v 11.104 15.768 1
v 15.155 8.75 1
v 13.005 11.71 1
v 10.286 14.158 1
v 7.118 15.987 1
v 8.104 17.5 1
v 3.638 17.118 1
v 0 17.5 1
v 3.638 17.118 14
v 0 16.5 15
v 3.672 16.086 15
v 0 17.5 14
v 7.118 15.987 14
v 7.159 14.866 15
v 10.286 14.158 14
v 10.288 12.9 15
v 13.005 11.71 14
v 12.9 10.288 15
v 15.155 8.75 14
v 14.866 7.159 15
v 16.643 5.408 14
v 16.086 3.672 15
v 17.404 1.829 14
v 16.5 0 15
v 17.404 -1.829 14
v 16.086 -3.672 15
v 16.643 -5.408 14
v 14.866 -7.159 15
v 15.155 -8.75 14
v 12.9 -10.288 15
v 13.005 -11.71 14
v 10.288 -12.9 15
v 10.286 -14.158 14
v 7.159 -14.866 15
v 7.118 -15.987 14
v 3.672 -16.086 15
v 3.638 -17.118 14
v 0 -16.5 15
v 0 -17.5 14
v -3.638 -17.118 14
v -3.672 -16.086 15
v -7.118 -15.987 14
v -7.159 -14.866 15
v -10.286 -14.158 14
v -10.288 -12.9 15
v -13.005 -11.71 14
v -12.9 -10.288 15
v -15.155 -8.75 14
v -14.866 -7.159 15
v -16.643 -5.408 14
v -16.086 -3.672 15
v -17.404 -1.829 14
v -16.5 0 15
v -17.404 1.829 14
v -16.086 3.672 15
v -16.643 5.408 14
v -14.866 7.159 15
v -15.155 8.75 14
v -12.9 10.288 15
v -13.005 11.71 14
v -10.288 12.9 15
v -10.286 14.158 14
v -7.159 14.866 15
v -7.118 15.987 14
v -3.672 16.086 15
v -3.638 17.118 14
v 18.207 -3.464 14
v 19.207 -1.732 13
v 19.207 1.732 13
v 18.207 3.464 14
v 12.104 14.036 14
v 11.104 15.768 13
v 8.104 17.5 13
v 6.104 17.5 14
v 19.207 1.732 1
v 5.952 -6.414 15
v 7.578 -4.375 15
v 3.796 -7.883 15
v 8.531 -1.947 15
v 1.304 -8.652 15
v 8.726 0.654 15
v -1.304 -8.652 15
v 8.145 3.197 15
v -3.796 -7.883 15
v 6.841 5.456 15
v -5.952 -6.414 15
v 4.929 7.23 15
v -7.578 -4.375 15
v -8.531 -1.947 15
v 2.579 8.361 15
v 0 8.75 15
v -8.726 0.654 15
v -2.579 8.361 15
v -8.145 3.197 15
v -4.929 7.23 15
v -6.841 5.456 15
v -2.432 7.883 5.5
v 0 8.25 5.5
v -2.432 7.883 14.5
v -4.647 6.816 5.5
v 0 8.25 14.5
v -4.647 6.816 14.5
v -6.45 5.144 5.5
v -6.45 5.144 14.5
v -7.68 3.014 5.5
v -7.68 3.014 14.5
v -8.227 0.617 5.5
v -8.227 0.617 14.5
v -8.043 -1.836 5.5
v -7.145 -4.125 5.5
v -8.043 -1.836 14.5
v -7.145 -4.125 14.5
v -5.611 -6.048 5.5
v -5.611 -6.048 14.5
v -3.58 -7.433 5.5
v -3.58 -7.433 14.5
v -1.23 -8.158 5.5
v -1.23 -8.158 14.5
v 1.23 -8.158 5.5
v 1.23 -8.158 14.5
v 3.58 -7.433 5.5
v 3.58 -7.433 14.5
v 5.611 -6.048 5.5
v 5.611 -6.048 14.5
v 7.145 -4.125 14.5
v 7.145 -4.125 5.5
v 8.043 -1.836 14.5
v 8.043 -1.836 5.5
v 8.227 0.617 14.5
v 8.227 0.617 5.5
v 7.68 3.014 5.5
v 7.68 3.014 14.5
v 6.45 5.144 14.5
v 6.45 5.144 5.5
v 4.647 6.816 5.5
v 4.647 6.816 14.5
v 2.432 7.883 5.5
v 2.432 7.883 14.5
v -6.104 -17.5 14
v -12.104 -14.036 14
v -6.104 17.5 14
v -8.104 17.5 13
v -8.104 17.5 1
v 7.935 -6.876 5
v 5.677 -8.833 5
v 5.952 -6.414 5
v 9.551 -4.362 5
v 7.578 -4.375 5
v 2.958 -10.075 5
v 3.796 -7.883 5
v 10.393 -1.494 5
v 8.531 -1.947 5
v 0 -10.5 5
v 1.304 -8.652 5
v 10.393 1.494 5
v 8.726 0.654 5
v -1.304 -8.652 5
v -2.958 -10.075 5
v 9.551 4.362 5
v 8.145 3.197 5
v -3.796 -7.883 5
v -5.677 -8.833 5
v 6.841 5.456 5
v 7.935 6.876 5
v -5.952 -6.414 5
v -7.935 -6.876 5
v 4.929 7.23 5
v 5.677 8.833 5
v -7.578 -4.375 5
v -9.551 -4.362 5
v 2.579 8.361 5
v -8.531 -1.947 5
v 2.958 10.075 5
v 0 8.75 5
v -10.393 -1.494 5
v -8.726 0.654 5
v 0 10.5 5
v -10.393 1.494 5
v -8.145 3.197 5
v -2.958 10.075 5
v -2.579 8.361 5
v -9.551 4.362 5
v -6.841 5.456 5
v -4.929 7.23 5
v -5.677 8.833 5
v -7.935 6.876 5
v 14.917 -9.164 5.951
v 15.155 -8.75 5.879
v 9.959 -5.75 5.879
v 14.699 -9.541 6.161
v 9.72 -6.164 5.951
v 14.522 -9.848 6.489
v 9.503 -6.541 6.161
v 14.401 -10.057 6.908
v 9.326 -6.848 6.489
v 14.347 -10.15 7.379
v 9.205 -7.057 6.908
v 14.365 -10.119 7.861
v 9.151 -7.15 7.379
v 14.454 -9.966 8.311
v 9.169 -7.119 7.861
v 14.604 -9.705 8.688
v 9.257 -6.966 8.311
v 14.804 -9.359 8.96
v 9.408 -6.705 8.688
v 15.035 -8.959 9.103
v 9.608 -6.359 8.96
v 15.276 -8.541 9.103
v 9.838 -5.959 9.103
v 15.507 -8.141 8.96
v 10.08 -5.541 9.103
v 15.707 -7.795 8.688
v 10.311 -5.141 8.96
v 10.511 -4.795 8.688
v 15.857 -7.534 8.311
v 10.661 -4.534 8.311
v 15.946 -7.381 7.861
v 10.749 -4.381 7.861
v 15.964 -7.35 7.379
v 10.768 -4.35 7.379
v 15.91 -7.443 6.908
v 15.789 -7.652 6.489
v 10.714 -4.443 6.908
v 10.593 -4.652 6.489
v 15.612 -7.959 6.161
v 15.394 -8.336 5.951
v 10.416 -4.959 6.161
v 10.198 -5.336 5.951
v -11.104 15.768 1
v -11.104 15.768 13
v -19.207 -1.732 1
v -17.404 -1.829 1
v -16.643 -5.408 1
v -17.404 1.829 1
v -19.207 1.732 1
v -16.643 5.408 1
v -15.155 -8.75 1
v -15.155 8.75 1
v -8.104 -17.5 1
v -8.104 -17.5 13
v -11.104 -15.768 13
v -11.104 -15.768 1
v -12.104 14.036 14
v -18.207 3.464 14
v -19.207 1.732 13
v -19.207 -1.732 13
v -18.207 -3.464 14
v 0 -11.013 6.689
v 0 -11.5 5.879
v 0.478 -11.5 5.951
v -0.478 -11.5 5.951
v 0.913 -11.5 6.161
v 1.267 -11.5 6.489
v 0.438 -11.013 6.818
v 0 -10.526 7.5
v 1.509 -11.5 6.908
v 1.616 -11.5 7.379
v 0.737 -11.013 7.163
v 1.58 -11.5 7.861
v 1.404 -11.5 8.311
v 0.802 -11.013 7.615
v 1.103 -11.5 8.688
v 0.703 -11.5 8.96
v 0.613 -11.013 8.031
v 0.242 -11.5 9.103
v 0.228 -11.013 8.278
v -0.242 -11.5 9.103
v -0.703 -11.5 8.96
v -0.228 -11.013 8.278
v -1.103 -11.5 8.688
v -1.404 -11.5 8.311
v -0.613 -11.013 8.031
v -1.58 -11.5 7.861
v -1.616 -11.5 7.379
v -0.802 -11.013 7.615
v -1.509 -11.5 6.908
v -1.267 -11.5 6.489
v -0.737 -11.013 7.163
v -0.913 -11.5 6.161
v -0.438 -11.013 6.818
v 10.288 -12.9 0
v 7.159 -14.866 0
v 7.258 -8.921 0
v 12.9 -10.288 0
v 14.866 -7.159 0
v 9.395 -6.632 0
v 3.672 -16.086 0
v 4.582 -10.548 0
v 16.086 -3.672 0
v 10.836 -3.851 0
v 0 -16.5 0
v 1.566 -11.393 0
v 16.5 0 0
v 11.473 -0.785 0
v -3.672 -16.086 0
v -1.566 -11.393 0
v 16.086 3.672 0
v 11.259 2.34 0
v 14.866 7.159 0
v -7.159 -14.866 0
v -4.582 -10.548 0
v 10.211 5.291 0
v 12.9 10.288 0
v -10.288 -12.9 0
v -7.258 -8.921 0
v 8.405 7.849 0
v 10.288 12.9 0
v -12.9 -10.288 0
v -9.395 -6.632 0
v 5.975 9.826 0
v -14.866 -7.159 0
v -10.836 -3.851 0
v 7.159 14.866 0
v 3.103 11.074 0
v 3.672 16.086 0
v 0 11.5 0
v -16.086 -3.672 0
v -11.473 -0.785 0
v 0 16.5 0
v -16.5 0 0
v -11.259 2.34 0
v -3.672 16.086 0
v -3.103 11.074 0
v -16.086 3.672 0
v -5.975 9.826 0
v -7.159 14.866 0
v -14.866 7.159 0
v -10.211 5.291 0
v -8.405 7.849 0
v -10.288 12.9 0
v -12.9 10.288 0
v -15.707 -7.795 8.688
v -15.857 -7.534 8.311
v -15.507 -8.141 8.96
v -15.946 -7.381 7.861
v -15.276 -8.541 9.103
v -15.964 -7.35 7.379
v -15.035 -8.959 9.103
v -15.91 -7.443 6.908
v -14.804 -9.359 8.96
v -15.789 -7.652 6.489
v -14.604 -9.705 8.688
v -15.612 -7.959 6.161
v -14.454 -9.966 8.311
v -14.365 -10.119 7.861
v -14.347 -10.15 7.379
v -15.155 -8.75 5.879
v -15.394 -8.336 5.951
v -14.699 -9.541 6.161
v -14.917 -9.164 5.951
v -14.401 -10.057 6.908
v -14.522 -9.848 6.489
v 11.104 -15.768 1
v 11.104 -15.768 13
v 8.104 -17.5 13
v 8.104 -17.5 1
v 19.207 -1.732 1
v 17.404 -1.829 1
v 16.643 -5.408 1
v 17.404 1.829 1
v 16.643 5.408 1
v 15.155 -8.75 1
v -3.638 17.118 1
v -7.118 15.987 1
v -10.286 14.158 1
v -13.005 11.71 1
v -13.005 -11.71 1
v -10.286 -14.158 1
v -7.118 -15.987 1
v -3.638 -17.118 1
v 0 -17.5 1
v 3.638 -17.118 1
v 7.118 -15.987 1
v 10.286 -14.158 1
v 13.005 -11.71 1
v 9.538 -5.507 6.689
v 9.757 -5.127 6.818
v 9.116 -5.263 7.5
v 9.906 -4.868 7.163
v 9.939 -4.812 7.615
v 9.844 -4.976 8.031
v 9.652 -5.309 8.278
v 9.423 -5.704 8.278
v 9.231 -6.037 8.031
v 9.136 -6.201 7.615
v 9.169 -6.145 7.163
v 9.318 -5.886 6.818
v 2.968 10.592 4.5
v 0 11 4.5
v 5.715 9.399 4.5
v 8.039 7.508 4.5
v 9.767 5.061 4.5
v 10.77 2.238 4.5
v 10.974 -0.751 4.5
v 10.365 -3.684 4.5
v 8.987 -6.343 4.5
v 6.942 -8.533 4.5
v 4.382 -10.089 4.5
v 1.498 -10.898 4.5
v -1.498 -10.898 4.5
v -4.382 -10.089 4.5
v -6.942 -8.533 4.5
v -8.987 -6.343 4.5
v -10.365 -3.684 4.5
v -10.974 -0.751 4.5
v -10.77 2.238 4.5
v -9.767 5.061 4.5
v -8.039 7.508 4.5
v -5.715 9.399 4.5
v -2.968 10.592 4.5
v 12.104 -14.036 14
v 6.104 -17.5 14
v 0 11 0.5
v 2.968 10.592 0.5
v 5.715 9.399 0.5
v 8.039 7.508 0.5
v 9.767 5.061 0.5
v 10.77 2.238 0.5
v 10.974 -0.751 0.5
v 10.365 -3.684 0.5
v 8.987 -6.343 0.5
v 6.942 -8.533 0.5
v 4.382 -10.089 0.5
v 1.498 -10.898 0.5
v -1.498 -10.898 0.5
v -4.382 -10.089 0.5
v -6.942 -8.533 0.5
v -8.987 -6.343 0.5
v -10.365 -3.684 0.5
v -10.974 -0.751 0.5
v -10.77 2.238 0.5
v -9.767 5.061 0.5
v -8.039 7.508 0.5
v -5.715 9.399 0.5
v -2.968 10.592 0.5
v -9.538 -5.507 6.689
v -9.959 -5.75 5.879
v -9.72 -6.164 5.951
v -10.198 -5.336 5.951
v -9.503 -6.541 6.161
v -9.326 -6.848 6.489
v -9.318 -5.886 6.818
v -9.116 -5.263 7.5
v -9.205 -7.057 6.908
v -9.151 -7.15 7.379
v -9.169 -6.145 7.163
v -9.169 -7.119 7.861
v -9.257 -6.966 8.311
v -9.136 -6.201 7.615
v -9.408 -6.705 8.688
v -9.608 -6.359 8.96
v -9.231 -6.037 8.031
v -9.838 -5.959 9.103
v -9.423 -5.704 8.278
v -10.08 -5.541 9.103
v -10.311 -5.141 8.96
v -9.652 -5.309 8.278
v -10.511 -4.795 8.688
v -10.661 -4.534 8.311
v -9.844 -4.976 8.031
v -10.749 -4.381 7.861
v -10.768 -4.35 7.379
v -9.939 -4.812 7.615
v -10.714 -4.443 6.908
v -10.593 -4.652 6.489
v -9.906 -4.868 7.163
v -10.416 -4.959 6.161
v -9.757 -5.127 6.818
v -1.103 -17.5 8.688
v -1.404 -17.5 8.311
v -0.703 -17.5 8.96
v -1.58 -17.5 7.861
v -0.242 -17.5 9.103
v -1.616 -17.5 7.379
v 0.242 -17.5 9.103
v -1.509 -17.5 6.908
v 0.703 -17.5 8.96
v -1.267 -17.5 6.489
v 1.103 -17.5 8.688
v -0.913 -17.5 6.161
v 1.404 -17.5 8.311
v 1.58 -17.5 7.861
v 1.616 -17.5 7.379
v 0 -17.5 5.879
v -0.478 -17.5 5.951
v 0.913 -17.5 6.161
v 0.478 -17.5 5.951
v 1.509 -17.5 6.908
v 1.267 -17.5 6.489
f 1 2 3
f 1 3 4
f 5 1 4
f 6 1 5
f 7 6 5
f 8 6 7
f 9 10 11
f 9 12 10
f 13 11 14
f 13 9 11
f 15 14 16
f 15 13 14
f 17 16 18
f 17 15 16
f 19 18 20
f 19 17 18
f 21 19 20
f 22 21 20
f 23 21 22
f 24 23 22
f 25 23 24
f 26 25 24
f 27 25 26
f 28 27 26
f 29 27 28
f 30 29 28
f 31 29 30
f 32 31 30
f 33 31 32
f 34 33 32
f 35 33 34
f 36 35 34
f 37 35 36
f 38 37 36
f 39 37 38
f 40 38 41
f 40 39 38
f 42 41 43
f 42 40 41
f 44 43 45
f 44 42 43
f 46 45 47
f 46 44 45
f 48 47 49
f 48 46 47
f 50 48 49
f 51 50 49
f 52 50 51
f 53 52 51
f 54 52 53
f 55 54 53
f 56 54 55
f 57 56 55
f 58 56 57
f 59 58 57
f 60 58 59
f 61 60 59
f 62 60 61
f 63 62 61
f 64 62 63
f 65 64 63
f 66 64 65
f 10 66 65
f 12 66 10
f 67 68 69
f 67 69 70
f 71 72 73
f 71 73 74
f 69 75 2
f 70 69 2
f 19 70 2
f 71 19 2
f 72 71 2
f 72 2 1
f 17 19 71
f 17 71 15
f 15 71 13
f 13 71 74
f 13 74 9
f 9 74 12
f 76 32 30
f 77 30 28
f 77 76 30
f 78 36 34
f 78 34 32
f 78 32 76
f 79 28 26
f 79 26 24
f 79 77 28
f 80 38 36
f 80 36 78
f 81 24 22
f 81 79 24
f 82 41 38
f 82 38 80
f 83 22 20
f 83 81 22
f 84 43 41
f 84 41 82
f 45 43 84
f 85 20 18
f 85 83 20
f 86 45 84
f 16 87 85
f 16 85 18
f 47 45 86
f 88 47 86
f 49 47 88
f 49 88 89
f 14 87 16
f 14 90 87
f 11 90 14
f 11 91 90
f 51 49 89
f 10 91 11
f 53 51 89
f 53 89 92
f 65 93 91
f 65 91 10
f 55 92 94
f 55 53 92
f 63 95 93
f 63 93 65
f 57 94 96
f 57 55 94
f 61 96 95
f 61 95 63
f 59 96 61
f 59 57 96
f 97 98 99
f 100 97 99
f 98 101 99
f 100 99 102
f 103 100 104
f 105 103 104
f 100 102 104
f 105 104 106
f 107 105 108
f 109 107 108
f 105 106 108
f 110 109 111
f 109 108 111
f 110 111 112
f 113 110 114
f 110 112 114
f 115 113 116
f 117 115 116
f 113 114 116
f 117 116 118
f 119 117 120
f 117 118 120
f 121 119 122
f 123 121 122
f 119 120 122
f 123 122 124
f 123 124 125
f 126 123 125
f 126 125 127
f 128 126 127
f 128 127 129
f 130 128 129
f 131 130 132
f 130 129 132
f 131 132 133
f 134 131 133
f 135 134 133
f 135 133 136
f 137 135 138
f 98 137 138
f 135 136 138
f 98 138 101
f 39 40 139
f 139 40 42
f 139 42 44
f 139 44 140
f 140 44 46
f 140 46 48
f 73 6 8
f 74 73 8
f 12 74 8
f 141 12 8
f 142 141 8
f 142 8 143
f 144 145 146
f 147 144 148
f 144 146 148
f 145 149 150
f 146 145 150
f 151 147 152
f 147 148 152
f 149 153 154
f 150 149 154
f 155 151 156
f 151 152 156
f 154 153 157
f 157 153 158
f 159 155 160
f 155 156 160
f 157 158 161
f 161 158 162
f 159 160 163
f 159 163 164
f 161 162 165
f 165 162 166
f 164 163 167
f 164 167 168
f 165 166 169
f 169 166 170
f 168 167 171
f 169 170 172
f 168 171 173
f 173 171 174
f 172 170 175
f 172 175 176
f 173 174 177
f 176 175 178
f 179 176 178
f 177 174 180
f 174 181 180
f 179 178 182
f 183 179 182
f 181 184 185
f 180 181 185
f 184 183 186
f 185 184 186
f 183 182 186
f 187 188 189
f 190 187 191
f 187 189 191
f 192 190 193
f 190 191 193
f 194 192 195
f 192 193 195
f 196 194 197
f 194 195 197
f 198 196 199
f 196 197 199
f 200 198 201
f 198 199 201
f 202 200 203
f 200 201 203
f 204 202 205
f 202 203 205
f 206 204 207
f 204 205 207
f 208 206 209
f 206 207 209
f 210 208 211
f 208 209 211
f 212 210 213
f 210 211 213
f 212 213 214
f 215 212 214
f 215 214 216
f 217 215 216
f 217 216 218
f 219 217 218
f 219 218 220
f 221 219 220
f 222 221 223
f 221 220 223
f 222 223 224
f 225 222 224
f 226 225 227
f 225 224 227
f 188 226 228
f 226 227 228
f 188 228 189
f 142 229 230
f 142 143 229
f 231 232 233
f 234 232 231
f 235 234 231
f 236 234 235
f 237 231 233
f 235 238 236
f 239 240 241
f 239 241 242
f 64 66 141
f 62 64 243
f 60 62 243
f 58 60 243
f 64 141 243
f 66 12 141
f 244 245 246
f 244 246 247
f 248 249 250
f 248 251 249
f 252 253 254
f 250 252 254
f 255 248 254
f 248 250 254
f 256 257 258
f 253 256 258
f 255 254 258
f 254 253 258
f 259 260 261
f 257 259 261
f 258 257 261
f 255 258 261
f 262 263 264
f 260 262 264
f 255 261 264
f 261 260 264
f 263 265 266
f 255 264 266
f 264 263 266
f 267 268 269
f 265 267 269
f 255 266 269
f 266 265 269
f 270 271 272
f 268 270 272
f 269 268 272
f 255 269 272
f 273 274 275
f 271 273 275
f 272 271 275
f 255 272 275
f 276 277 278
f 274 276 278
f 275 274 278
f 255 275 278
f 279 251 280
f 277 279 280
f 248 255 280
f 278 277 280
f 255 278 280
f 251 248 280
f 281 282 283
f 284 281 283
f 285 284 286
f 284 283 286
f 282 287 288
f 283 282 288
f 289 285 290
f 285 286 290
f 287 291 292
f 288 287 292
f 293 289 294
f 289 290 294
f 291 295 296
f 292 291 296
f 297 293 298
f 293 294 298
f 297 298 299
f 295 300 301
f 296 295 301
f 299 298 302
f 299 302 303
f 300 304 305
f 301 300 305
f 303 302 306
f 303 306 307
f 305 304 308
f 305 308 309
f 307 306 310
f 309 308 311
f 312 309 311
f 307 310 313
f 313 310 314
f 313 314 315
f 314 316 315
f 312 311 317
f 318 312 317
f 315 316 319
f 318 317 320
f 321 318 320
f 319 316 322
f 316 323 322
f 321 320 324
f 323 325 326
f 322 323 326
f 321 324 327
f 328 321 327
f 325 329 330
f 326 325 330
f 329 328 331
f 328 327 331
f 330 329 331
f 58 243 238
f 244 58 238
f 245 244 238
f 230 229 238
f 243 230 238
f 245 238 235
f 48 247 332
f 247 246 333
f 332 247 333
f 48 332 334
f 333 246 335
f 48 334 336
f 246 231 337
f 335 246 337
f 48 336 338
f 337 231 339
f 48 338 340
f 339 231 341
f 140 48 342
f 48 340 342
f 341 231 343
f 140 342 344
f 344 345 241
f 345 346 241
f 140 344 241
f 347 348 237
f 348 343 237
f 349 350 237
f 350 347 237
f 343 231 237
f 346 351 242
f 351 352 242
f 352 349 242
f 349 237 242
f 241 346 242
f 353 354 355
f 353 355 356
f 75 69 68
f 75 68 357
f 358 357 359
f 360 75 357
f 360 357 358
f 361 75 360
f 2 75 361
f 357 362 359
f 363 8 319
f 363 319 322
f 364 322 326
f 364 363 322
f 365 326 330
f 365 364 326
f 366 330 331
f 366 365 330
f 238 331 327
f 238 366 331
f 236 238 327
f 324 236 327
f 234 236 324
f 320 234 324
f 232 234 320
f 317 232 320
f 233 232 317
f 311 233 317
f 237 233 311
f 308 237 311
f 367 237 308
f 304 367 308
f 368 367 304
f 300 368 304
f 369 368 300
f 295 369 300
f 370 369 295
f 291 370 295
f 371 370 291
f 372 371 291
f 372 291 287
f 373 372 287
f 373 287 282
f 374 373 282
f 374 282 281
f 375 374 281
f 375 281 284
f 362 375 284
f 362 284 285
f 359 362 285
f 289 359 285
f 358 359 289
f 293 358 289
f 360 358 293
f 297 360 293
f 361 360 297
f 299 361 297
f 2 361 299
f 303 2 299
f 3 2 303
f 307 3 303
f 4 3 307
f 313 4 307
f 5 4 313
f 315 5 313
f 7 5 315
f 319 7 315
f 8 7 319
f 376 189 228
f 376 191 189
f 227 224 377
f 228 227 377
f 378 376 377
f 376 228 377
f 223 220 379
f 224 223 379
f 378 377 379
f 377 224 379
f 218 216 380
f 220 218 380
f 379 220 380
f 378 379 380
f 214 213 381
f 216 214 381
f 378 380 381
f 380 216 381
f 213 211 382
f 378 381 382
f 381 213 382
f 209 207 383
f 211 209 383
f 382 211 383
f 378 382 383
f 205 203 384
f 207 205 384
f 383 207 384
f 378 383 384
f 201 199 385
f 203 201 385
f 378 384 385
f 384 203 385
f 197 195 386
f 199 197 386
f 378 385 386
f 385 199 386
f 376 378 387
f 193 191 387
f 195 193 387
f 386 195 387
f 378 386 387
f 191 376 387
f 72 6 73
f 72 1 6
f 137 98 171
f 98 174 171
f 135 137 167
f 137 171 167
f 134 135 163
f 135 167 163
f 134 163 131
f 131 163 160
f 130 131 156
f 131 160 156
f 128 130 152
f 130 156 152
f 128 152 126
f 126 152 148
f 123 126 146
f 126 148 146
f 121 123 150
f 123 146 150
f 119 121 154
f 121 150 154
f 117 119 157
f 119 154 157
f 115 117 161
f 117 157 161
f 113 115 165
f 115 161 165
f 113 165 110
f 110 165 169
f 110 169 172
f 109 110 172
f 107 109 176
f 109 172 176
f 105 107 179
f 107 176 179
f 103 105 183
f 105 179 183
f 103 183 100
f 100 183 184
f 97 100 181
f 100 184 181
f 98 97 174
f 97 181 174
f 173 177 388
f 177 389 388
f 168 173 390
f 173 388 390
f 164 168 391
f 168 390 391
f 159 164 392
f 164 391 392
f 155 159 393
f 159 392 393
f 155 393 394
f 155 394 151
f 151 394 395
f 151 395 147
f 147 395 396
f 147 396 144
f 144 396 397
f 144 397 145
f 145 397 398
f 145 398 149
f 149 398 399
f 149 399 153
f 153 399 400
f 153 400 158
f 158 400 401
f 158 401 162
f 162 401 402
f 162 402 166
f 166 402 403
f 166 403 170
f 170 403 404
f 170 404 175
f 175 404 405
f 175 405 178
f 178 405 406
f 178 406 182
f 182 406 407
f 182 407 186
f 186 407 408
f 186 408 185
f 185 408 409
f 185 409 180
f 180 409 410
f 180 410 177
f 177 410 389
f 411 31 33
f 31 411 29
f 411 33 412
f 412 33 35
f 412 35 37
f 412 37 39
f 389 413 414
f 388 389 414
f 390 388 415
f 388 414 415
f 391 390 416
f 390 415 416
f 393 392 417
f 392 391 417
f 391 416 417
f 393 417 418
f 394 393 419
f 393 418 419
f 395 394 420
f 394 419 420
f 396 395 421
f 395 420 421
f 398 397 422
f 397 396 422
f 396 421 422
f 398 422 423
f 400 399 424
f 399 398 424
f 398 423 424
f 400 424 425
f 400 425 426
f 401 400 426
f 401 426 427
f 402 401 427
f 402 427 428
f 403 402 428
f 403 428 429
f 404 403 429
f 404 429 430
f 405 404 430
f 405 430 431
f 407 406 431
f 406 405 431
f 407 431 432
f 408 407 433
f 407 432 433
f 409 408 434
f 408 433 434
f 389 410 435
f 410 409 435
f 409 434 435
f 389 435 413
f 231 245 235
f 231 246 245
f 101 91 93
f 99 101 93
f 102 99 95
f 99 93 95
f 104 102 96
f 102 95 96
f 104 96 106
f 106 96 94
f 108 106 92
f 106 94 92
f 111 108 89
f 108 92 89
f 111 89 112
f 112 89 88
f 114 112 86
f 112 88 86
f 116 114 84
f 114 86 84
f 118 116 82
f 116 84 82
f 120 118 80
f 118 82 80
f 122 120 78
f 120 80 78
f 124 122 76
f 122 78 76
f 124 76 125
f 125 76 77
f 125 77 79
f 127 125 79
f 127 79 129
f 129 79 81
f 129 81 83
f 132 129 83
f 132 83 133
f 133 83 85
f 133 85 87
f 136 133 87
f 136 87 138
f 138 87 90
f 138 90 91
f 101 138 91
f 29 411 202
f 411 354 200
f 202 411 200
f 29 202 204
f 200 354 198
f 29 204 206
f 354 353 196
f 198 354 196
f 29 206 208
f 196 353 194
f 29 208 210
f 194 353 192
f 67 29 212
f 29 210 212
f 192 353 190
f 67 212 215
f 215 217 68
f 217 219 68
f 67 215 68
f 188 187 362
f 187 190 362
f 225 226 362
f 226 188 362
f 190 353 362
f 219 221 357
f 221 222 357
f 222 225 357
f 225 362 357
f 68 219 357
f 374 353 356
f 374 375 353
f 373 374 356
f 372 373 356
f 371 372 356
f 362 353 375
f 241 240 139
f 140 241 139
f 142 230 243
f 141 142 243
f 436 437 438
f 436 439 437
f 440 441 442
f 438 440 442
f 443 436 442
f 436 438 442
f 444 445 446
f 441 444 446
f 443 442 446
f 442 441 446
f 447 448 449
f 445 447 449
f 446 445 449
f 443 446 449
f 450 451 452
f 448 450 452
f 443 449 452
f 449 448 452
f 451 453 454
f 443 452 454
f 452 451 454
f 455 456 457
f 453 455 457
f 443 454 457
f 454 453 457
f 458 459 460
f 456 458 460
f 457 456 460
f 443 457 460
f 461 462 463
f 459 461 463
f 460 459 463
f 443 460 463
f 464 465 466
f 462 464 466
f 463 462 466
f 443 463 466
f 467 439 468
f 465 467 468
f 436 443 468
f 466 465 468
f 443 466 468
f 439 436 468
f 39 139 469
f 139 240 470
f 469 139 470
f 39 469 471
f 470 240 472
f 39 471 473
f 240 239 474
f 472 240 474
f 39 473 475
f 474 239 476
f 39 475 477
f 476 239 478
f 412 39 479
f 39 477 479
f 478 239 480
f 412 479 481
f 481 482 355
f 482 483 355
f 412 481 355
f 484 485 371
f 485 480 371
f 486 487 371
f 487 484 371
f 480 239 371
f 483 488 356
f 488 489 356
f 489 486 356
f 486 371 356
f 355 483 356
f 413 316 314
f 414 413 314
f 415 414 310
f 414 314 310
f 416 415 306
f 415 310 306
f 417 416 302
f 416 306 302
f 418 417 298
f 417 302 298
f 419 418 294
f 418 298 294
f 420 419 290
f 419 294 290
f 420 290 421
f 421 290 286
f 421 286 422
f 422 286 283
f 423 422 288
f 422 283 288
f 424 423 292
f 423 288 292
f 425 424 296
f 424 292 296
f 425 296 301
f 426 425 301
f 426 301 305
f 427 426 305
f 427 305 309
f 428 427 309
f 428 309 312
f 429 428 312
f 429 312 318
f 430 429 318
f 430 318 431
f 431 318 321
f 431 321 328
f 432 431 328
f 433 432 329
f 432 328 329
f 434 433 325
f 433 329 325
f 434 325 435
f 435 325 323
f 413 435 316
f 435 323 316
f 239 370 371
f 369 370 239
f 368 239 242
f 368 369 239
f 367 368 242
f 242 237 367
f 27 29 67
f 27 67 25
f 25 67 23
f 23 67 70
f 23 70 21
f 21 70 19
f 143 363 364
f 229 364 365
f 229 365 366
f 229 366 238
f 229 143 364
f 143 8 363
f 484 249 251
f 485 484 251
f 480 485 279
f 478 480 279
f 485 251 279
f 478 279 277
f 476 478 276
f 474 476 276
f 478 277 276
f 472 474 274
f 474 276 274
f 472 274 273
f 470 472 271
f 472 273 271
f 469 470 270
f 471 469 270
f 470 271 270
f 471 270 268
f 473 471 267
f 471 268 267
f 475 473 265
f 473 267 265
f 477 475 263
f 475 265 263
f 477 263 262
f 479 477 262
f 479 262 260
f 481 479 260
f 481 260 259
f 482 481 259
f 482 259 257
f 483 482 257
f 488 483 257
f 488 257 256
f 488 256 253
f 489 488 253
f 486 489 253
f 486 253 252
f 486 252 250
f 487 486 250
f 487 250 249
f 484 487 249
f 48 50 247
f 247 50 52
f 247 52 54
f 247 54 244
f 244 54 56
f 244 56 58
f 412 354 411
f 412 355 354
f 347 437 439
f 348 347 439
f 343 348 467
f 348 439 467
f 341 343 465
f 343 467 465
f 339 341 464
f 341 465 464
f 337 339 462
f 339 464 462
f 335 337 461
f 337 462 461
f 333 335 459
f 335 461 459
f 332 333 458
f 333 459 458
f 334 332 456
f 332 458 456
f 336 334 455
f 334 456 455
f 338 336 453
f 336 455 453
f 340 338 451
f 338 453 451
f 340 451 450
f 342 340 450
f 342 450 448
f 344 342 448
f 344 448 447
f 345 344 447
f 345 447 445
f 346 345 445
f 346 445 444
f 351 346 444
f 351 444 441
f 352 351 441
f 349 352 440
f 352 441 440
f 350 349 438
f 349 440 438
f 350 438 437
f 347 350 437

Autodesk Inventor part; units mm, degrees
ref_plane "YZ Plane" through (0, 0, 0) normal (1, 0, 0) x (0, 1, 0)
ref_plane "XZ Plane" through (0, 0, 0) normal (0, 1, 0) x (-1, 0, 0)
sketch "Esquisse1" plane through (0, 0, 0) normal (1, 0, 0) x (0, 1, 0)
  line L0 (0, 0) -> (0, 17.727)
  line L1 (8.25, 5) -> (8.25, 15)
  line L2 (8.25, 5) -> (11, 5)
  line L3 (11, 5) -> (11, 0)
  line L4 (17.5, 14) -> (17.5, 1)
  line L5 (16.5, 0) -> (11, 0)
  line L6 (8.25, 15) -> (16.5, 15)
  line L7 (16.5, 15) -> (17.5, 14)
  line L8 (17.5, 1) -> (16.5, 0)
  dimension "d1" = 16.5
  dimension "d2" = 22
  dimension "d3" = 35
  dimension "d4" = 5
  dimension "d71" = 1
  dimension "d72" = 1
  dimension "d77" = 1
  dimension "d78" = 1
  dimension "d82" = 15
revolve "Révolution1" add sketch "Esquisse1" angle 360 about axis through (0, 0, 0) along (0, 0, 1)
ref_plane "Plan de construction1" through (0, 0, 1) normal (0, 0, -1) x (-1, 0, 0)
sketch "Esquisse2" plane through (0, 0, 1) normal (0, 0, -1) x (-1, 0, 0)
  line L0 (10.1036, 17.5) -> (20.2073, 0)
  line L1 (20.2073, 0) -> (10.1036, -17.5)
  line L2 (10.1036, -17.5) -> (-10.1036, -17.5)
  line L3 (-10.1036, -17.5) -> (-20.2073, 0)
  line L4 (-20.2073, 0) -> (-10.1036, 17.5)
  line L5 (-10.1036, 17.5) -> (10.1036, 17.5)
  circle A0 centre (0, 0) radius 17.5 projected
  arc A1 (-15.1554, 8.75) -> (15.1554, 8.75) centre (0, 0) ccw
extrude "Extrusion1" add sketch "Esquisse2" against normal blind 13 contours L0 A0 L5 | L0 L1 A0 | A0 L4 L5 | A0 L3 L4 | L1 L2 A0 | A0 L2 L3
chamfer "Chanfrein1" distance 0.5 angle 45 2 edges at (0, -11, 0) (0, -11, 5)
chamfer "Chanfrein2" distance 2 angle 45 6 edges at (10.1036, 17.5, 7.5) (20.2073, 0, 7.5) (10.1036, -17.5, 7.5) (-10.1036, -17.5, 7.5) (-20.2073, 0, 7.5) (-10.1036, 17.5, 7.5)
sketch "Esquisse3" plane through (-8.1036, -17.5, 1) normal (0, -1, 0) x (1, 0, 0)
  line L0 (0, 13) -> (16.2073, 13) projected
  line L1 (-8.3964, -1) -> (24.6036, -1) projected
  line L2 (0, 0) -> (0, 13) projected
  point P0 (8.1036, -1)
  point P1 (8.1036, 6.5)
  point P2 (8.1036, 0)
  point P3 (16.2073, 0)
  point P4 (8.1036, 0)
  point P5 (8.1036, 13)
  point P6 (0, 6.5)
hole "Perçage1" at (0, -17.5, 7.5) direction (0, 1, 0) diameter 3.242 depth 6 tip angle 118 thread size "M4x0.7" class "6H" standard "ISO Metric profile"
chamfer "Chanfrein4" distance 0.5 angle 45 2 edges at (0, -8.25, 15) (0, -8.25, 5)
chamfer "Chanfrein5" distance 1 angle 45 6 edges at (9.6036, 16.634, 14) (19.2073, 0, 14) (9.6036, -16.634, 14) (-9.6036, -16.634, 14) (-19.2073, 0, 14) (-9.6036, 16.634, 14)
pattern_circular "Réseau circulaire2" count 3 over 120 about axis through (0, 0, -10) along (0, 0, 1) of "Perçage1" both ways yes
equation "\"d72\" = d71"
equation "\"d78\" = d77"
properties part number "support_canon" material "Aluminium 6061"
